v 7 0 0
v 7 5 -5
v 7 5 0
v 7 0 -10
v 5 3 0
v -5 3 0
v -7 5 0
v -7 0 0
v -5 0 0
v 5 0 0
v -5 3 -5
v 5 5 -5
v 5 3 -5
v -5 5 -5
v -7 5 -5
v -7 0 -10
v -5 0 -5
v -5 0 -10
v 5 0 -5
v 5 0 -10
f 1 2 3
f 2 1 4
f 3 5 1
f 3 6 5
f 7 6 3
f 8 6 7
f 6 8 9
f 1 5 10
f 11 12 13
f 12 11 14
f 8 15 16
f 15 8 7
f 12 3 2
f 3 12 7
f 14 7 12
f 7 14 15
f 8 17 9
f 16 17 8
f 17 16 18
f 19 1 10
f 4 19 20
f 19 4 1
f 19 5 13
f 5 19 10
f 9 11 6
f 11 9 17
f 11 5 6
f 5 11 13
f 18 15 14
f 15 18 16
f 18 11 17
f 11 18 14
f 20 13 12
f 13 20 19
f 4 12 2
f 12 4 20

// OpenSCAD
module addon_holder() {
    iw = 10; // inner width
    it = 3;  // inner thickness
    h = 5;   // height
    wt = 2;  // wall thickness
    
    module reinforcement() {
        rotate(90, [0, 0, 1])
        rotate(90, [1, 0, 0])
        linear_extrude(height=wt)
        polygon([
            [0, 0],
            [it+wt, 0],
            [0, -h]
        ]);
    }
    
    translate([-wt-iw/2, 0, -h]) {
        difference() {
            cube([iw+2*wt, it+wt, h]);
            translate([wt, -1, -1]) cube([iw, it+1, h+2]);
        }
        reinforcement();
        translate([iw+wt, 0, 0]) reinforcement();
    }
}

addon_holder();
